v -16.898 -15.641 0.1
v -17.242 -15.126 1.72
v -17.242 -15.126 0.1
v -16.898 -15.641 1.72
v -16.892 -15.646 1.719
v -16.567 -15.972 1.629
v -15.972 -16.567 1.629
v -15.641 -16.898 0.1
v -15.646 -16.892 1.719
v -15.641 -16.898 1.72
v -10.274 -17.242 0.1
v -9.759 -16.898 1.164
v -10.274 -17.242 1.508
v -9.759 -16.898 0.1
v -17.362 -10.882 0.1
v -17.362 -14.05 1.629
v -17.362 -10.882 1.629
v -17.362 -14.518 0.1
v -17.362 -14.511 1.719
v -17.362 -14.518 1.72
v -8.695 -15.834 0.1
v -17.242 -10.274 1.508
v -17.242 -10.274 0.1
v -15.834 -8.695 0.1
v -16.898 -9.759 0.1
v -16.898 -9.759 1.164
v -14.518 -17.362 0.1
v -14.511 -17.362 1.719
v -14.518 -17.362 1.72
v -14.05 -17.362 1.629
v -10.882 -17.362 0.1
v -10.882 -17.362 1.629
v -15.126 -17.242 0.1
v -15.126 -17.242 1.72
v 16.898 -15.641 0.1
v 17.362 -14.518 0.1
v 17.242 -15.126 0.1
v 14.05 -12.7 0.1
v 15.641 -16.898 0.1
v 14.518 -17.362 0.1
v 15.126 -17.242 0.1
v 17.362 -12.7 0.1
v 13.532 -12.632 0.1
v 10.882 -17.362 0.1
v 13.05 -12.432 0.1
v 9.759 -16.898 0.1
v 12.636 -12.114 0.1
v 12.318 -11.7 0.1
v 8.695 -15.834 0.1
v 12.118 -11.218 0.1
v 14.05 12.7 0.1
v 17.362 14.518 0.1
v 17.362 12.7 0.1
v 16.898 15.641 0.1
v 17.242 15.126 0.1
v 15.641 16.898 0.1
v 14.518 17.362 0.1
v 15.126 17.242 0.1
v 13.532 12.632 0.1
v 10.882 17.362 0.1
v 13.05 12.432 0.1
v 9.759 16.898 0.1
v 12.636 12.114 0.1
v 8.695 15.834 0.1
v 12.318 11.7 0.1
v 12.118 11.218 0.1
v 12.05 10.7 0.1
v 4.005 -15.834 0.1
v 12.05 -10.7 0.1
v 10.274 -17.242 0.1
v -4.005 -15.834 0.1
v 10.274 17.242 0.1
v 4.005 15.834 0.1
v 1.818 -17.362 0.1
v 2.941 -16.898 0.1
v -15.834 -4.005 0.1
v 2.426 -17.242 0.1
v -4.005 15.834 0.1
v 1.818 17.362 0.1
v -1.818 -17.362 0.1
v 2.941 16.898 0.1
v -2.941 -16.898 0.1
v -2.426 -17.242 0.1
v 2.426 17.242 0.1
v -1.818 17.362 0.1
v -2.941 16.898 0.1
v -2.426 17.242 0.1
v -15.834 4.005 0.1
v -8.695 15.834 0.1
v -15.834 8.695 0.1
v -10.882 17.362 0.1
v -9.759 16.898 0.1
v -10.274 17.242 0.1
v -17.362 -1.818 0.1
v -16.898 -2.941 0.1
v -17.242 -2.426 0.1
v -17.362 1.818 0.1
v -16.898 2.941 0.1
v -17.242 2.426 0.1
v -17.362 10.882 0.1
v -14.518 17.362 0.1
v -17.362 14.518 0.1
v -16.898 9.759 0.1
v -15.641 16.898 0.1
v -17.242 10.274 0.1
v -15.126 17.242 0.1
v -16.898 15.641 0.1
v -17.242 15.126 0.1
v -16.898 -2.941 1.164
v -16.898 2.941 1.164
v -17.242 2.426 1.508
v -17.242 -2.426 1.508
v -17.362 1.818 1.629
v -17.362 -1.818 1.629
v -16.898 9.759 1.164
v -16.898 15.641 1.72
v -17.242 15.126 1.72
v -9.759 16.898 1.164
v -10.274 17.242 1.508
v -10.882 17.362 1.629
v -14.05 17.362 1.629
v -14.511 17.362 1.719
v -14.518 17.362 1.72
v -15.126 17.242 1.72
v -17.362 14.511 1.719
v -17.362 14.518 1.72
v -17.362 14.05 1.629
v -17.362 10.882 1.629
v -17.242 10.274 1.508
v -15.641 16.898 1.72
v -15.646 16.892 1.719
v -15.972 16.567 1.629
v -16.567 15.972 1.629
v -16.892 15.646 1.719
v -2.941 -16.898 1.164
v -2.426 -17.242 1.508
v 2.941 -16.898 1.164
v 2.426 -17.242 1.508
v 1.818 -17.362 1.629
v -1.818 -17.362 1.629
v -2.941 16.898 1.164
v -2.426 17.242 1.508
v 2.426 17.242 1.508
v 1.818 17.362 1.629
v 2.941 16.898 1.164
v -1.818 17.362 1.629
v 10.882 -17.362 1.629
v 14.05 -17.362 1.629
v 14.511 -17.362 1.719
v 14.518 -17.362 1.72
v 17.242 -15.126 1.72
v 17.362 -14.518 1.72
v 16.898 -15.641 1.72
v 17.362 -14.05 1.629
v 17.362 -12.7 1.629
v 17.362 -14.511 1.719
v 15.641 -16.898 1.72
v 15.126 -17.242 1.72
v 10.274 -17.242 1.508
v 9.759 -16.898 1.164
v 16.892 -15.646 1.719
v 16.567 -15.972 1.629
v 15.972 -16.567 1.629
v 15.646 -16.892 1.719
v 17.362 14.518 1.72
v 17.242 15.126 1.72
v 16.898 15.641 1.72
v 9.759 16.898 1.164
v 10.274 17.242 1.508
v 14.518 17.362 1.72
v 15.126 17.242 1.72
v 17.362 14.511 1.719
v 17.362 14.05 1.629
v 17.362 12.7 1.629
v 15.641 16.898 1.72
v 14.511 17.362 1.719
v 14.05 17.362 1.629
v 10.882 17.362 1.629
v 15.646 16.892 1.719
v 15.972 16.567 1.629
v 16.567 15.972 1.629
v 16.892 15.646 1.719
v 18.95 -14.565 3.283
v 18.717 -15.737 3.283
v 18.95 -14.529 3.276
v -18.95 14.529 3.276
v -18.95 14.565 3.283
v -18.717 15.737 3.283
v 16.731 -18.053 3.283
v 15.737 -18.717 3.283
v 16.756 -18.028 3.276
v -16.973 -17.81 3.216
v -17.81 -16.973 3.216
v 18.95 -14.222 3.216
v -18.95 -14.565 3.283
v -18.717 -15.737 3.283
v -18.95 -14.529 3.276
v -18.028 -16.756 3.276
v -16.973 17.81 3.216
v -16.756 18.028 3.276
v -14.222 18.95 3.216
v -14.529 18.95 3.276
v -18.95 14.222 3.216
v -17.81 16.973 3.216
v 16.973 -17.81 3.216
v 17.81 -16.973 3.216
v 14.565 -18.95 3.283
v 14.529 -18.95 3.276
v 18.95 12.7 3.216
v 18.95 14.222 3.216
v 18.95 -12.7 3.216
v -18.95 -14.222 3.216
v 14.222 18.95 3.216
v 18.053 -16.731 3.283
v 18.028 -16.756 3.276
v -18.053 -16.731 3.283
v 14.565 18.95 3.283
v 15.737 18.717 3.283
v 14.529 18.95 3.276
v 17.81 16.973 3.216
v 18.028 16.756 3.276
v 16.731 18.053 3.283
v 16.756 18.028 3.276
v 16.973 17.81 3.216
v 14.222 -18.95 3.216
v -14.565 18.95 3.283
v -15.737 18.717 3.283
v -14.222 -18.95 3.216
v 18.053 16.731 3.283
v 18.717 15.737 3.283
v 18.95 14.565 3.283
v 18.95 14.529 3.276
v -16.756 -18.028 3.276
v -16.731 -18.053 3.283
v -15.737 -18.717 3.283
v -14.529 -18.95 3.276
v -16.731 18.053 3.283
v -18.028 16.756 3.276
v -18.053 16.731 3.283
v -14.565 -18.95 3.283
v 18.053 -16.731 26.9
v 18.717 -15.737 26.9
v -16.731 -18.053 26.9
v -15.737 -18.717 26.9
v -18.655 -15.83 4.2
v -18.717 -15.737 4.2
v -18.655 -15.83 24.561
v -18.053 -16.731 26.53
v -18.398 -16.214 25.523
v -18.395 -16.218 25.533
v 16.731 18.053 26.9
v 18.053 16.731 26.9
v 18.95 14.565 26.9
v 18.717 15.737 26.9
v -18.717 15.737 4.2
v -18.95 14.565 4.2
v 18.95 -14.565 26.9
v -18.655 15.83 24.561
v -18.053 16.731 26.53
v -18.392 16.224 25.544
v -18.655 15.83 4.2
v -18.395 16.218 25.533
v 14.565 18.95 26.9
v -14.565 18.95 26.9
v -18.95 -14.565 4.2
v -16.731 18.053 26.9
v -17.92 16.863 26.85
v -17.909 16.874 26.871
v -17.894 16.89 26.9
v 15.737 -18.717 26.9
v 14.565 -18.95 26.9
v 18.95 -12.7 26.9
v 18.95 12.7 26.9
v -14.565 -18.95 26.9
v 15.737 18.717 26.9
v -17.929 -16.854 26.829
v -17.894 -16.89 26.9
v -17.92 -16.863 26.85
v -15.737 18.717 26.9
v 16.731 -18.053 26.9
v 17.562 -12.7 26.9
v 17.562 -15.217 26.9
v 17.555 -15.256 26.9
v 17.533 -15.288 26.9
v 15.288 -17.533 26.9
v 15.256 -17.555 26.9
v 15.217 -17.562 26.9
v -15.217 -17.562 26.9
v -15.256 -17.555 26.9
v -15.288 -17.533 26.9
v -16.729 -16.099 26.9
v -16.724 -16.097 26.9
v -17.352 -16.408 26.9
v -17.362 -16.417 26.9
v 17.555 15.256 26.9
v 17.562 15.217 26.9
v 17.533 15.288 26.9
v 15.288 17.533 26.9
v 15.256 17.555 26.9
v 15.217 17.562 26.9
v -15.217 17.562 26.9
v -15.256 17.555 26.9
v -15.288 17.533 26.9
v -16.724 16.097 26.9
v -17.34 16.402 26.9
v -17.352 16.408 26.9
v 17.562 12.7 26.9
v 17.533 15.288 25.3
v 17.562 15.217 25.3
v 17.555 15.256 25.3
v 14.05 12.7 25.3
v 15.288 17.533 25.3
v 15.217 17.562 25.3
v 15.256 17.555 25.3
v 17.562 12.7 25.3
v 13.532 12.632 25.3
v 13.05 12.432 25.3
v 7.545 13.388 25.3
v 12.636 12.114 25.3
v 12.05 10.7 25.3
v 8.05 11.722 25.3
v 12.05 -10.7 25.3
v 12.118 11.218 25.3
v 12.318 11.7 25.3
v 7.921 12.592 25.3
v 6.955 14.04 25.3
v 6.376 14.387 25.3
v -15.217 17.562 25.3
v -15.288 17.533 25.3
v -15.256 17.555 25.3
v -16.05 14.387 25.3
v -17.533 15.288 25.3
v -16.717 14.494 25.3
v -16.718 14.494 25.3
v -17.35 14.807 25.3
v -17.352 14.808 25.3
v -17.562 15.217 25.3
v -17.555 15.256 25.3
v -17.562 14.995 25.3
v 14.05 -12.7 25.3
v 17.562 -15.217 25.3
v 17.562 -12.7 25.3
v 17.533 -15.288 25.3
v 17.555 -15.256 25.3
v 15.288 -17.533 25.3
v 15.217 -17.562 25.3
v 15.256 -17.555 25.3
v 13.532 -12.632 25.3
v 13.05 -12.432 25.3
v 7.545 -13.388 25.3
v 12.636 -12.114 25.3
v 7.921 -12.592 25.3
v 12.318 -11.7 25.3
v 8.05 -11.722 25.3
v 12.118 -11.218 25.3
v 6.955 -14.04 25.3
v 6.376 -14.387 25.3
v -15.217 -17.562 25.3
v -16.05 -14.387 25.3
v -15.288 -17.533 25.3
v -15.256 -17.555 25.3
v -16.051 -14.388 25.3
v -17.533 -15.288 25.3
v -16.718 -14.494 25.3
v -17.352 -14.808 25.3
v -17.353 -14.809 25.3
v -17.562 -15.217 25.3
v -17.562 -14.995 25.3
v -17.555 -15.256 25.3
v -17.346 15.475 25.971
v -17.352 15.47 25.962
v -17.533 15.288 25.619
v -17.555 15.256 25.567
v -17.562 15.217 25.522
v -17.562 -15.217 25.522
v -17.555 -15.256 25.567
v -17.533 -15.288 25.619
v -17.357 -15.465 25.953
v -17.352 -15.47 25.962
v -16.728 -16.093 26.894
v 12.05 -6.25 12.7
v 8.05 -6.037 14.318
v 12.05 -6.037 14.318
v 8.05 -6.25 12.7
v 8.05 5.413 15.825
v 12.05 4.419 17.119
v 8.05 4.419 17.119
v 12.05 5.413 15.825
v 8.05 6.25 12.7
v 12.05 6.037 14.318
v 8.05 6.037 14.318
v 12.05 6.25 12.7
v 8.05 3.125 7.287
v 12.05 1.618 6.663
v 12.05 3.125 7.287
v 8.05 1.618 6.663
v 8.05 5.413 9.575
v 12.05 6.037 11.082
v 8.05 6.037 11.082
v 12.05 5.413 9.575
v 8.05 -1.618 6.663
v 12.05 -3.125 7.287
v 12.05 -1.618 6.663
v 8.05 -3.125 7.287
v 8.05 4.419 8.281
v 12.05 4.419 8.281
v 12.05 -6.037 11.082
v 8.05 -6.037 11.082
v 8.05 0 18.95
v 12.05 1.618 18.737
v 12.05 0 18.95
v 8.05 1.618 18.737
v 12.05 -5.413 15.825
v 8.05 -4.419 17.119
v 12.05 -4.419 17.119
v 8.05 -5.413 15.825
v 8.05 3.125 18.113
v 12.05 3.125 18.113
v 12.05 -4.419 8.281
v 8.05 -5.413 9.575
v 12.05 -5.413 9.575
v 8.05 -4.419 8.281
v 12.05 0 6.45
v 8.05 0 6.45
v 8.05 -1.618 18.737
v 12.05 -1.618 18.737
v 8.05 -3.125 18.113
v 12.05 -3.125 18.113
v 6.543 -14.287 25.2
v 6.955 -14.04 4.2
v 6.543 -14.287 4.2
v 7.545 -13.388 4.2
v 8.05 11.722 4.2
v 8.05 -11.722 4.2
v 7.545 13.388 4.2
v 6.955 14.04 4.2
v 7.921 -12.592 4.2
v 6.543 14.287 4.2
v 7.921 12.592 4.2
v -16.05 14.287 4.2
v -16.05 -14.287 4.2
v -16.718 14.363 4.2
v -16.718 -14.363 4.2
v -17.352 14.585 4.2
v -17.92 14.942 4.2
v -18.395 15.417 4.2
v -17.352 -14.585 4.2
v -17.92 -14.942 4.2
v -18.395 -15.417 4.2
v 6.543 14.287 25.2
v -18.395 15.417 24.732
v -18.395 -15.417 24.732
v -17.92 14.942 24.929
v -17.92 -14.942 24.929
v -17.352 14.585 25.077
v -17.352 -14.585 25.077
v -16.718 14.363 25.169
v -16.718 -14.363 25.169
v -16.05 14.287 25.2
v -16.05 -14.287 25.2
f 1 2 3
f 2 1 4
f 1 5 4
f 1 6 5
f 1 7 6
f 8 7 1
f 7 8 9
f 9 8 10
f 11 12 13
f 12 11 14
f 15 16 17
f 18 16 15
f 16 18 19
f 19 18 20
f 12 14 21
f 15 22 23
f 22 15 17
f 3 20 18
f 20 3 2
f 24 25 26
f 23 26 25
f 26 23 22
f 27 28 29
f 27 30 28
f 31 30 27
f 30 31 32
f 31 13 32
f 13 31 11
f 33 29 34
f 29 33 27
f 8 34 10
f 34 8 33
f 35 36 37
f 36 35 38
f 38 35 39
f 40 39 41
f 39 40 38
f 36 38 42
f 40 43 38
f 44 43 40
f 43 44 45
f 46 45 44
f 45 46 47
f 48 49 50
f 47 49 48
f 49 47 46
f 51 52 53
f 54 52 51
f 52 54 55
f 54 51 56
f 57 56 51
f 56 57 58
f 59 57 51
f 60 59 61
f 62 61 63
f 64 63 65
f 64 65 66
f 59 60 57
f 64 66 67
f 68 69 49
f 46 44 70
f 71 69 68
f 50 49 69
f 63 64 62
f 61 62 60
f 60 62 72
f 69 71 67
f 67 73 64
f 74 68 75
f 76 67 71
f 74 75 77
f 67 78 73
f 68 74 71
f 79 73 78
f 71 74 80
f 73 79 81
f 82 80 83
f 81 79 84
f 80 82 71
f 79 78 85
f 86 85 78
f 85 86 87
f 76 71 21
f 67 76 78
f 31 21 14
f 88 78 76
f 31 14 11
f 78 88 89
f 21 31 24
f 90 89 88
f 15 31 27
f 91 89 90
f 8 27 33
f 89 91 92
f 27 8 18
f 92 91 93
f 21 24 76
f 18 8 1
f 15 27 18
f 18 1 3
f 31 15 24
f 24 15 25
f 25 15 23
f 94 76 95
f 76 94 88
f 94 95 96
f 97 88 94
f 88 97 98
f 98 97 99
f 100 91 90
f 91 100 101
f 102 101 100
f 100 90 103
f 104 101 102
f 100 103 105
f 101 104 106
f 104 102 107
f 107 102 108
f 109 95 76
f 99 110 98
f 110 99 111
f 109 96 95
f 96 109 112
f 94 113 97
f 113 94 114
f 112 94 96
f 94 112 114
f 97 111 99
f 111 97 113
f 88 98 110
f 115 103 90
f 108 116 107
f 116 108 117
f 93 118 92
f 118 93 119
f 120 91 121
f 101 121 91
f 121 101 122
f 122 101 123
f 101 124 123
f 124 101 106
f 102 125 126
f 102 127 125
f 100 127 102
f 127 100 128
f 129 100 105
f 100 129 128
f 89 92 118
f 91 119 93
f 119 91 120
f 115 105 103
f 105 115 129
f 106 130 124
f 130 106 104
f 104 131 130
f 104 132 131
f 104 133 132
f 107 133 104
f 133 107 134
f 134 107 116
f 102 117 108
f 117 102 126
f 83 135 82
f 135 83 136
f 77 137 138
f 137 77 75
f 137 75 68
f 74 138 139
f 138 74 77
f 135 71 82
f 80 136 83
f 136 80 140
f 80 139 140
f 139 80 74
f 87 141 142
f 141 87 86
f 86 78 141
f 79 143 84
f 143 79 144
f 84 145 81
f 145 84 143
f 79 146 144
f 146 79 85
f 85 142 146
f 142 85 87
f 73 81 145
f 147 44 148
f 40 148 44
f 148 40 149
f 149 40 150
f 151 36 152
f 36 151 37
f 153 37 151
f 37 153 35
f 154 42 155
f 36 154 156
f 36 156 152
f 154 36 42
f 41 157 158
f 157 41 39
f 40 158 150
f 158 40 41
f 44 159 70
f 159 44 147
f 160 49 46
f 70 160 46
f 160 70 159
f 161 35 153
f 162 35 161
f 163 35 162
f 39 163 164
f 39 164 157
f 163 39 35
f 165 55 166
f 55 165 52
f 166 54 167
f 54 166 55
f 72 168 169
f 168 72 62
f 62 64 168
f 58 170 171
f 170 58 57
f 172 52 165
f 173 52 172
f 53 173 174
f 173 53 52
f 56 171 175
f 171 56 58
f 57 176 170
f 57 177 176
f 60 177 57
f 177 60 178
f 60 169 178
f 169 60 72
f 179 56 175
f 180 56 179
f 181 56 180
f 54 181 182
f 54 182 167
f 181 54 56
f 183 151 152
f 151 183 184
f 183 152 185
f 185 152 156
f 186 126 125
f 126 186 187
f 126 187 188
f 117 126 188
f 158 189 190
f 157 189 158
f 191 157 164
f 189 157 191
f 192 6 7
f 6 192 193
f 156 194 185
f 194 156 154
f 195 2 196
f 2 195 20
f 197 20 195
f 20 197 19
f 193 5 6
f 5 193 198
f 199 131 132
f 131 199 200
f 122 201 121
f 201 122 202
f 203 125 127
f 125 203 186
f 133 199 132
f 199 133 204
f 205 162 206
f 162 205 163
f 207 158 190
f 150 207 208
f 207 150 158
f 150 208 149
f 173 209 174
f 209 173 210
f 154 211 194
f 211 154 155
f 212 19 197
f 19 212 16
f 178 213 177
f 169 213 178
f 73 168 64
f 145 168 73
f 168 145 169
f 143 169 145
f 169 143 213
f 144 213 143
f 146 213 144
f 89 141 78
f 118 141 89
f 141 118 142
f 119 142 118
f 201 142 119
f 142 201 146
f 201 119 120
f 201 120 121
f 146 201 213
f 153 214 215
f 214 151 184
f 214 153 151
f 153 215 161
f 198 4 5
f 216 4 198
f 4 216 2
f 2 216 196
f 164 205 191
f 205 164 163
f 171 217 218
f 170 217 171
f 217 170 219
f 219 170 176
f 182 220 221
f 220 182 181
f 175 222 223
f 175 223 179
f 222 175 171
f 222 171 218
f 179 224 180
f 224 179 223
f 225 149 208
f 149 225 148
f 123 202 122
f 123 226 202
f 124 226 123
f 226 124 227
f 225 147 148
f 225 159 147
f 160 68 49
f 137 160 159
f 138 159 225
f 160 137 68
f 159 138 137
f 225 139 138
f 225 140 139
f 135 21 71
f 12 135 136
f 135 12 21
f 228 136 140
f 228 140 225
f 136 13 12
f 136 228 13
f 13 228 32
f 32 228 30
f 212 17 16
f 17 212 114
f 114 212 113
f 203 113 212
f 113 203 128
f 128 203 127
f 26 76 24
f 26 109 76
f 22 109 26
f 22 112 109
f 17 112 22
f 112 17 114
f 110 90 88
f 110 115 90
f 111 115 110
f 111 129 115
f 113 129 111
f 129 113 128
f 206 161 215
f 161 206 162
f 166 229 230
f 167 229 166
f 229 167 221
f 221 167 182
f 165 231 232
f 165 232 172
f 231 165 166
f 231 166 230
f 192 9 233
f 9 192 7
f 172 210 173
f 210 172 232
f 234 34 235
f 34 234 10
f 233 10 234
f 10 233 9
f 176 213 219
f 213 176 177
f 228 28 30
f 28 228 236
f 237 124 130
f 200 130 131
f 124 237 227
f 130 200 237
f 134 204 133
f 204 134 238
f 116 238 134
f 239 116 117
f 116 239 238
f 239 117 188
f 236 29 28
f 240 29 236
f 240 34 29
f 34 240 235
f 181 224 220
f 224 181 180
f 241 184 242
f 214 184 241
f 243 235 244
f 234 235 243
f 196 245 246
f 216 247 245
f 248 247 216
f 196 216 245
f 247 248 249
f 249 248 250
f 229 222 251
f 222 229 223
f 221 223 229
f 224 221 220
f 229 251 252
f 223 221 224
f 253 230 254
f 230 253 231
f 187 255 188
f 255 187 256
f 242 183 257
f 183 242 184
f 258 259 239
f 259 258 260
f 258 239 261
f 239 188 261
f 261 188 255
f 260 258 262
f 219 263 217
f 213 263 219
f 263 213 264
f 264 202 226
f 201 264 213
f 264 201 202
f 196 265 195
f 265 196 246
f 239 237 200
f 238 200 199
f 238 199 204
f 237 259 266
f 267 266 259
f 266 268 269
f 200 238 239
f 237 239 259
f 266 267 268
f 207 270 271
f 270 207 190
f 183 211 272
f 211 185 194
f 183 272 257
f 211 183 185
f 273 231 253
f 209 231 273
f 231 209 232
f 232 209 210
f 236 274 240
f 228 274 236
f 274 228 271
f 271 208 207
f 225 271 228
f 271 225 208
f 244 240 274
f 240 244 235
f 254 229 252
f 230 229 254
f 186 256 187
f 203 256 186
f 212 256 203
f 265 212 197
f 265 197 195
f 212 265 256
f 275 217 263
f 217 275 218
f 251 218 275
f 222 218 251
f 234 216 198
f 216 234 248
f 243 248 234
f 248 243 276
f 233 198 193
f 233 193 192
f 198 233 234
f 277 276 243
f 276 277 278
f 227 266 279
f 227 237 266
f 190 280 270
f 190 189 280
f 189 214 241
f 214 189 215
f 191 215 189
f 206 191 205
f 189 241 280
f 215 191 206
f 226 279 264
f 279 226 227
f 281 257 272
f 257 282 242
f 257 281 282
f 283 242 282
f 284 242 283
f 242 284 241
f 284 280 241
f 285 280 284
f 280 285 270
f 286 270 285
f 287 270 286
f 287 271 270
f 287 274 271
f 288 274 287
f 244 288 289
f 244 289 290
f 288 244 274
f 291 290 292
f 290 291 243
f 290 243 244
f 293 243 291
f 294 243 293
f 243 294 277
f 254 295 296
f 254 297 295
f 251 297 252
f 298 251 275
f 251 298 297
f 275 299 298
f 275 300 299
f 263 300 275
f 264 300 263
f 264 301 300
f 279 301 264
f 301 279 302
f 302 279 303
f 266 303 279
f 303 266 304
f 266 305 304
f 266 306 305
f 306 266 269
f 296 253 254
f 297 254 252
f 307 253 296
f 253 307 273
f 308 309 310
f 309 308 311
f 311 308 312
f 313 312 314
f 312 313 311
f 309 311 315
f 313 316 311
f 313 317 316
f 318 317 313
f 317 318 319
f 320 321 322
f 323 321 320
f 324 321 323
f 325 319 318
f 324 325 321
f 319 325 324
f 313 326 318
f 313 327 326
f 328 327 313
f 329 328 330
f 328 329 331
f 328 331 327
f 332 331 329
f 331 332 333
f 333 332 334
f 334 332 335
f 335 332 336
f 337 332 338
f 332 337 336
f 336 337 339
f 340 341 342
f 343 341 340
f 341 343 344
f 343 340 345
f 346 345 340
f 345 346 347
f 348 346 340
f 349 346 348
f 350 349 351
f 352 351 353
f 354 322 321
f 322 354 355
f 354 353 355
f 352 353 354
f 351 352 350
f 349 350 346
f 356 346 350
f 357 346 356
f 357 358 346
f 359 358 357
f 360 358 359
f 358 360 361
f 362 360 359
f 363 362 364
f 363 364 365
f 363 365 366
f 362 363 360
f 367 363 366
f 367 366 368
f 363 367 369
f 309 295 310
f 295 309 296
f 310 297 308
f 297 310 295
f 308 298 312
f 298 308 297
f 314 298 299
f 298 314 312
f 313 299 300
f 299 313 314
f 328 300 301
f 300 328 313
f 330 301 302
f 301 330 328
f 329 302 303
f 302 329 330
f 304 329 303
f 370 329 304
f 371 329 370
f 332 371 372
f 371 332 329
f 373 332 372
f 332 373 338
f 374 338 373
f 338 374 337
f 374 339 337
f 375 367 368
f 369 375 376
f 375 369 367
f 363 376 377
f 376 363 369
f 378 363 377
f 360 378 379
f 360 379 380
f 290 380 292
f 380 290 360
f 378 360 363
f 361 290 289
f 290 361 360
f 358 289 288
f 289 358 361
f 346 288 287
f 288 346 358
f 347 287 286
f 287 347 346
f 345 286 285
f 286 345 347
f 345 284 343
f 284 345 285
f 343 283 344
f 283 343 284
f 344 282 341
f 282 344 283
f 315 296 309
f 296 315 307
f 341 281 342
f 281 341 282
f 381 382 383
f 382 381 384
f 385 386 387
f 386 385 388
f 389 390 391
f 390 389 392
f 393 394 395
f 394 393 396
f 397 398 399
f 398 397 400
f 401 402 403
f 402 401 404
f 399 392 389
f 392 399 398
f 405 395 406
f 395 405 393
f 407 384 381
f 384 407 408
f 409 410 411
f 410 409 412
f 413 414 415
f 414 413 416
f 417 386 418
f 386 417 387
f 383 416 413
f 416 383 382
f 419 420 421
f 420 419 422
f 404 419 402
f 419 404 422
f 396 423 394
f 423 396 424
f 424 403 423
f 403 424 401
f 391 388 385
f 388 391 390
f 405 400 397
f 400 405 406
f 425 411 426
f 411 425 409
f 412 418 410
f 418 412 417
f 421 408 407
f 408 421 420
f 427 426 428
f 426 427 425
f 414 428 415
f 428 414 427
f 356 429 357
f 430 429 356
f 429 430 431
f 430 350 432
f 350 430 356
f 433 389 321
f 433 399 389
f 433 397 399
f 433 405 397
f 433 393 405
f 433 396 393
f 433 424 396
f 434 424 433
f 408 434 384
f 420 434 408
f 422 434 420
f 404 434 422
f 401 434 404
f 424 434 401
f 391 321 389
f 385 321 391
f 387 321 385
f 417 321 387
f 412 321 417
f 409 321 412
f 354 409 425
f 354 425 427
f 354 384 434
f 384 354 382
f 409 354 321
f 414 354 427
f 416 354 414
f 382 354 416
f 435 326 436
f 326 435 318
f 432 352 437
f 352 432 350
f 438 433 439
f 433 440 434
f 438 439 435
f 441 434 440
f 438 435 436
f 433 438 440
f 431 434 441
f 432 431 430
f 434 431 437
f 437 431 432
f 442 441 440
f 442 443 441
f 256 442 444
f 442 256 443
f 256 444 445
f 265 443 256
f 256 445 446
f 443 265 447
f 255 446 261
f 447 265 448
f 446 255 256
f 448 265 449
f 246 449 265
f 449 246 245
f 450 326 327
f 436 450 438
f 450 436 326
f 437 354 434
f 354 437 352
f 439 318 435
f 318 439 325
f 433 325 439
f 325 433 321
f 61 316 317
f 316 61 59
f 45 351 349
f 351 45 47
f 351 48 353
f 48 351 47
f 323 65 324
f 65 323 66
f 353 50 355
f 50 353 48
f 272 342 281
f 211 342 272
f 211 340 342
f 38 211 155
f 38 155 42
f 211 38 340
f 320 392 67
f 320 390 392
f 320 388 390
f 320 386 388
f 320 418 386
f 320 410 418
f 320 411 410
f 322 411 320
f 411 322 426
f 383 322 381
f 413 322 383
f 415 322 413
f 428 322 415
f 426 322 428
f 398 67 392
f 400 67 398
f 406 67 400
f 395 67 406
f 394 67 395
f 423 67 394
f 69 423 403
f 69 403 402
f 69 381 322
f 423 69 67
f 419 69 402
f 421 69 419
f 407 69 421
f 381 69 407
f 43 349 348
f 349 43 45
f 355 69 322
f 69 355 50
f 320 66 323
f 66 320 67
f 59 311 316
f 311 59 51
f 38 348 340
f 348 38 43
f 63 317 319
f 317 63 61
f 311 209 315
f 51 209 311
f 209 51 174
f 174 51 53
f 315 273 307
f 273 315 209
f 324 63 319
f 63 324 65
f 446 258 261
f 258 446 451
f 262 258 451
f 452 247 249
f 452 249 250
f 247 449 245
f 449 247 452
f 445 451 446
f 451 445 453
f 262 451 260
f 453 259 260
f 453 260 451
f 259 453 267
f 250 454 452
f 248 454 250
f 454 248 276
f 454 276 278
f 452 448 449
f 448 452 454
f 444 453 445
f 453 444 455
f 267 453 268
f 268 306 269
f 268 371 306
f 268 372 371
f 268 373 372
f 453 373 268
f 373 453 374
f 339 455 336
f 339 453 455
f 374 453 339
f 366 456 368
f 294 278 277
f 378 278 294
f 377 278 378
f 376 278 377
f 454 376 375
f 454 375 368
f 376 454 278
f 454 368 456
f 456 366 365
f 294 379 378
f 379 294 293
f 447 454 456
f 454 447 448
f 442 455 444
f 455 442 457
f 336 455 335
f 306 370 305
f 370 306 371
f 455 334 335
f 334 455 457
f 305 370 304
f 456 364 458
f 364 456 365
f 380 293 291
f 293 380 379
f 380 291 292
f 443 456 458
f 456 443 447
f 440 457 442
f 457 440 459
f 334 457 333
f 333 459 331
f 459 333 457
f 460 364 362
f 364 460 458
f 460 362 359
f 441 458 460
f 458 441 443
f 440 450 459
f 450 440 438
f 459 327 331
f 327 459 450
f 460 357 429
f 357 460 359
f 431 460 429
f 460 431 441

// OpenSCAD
// GX12PortModule0.2
// 
// Block for holding a GX12 port sideways,
// e.g. for use with WeMosCase0
// 
// Based on WeMosCase0.6.1 
// 
// GX12 port dimensions:
// Neck diameter: About 12mm
// Max neck length: About 4.4mm
// Neck hex nut side-to-side: 15mm
// Neck hex nut corner-to-corner: 17mm
// Bottom of flange to top of mating threads: About 7mm
// 
// v0.1.1:
// - Remove some dead code
// v0.2:
// - Use TGPSCC0
// - Increase neck_hole_diameter from 12.1mm to 12.5mm, and make configurable

neck_hole_diameter = "12.5mm";

cross_section = false;

foot_rounding = 0.5; // [0.25:0.1:1]

$fn = 24;
$tgx11_offset = -0.1;

module __gx12portmodule0__end_params() { }

use <../lib/TGPSCC0.scad>
use <../lib/TGx11.1Lib.scad>
use <../lib/TOGMod1.scad>
use <../lib/TOGMod1Constructors.scad>
use <../lib/TOGPath1.scad>
use <../lib/TOGUnits1.scad>
use <../lib/TOGPolyhedronLib1.scad>

$togridlib3_unit_table = [
	// Hey, this should only apply to the feet, not to the sides of the cup!
	["tgp-m-outer-corner-radius", [255/64*foot_rounding,"u"]],
	each tgx11_get_default_unit_table()
];

block_height = "1inch";
u = togunits1_to_mm("1u");
block_height_mm = togunits1_to_mm(block_height);
limit_cavity_width_mm = togunits1_to_mm("1+1/8inch");

block_size_ca = [[1, "chunk"],[1, "chunk"],togunits1_to_ca(block_height)];
block_size_mm = togunits1_decode_vec(block_size_ca);

the_block = tgx11_block(
	block_size_ca,
	bottom_segmentation = "chatom",
	top_segmentation = "block",
	lip_height = 1.5
);
the_cavity = tgpscc0_make_gx12_cutout(
	block_size = block_size_mm,
	limit_cavity_width = limit_cavity_width_mm + 0.1,
	neck_hole_diameter = togunits1_decode(neck_hole_diameter)
);

the_module = ["difference",
	the_block,
   
	["translate", [0,0,block_size_mm[2]], ["intersection",
		tgpscc0_make_cavity_limit(block_size_mm, cavity_width=limit_cavity_width_mm),
		the_cavity,
	]],
];

togmod1_domodule(["difference",
	["union",
		the_module,
	],
	
	if( cross_section ) ["translate", [0,-block_size_mm[1]/2,block_size_mm[2]/2], togmod1_make_cuboid([block_size_mm[0]*2,38.1,block_size_mm[2]*3])],
]);
